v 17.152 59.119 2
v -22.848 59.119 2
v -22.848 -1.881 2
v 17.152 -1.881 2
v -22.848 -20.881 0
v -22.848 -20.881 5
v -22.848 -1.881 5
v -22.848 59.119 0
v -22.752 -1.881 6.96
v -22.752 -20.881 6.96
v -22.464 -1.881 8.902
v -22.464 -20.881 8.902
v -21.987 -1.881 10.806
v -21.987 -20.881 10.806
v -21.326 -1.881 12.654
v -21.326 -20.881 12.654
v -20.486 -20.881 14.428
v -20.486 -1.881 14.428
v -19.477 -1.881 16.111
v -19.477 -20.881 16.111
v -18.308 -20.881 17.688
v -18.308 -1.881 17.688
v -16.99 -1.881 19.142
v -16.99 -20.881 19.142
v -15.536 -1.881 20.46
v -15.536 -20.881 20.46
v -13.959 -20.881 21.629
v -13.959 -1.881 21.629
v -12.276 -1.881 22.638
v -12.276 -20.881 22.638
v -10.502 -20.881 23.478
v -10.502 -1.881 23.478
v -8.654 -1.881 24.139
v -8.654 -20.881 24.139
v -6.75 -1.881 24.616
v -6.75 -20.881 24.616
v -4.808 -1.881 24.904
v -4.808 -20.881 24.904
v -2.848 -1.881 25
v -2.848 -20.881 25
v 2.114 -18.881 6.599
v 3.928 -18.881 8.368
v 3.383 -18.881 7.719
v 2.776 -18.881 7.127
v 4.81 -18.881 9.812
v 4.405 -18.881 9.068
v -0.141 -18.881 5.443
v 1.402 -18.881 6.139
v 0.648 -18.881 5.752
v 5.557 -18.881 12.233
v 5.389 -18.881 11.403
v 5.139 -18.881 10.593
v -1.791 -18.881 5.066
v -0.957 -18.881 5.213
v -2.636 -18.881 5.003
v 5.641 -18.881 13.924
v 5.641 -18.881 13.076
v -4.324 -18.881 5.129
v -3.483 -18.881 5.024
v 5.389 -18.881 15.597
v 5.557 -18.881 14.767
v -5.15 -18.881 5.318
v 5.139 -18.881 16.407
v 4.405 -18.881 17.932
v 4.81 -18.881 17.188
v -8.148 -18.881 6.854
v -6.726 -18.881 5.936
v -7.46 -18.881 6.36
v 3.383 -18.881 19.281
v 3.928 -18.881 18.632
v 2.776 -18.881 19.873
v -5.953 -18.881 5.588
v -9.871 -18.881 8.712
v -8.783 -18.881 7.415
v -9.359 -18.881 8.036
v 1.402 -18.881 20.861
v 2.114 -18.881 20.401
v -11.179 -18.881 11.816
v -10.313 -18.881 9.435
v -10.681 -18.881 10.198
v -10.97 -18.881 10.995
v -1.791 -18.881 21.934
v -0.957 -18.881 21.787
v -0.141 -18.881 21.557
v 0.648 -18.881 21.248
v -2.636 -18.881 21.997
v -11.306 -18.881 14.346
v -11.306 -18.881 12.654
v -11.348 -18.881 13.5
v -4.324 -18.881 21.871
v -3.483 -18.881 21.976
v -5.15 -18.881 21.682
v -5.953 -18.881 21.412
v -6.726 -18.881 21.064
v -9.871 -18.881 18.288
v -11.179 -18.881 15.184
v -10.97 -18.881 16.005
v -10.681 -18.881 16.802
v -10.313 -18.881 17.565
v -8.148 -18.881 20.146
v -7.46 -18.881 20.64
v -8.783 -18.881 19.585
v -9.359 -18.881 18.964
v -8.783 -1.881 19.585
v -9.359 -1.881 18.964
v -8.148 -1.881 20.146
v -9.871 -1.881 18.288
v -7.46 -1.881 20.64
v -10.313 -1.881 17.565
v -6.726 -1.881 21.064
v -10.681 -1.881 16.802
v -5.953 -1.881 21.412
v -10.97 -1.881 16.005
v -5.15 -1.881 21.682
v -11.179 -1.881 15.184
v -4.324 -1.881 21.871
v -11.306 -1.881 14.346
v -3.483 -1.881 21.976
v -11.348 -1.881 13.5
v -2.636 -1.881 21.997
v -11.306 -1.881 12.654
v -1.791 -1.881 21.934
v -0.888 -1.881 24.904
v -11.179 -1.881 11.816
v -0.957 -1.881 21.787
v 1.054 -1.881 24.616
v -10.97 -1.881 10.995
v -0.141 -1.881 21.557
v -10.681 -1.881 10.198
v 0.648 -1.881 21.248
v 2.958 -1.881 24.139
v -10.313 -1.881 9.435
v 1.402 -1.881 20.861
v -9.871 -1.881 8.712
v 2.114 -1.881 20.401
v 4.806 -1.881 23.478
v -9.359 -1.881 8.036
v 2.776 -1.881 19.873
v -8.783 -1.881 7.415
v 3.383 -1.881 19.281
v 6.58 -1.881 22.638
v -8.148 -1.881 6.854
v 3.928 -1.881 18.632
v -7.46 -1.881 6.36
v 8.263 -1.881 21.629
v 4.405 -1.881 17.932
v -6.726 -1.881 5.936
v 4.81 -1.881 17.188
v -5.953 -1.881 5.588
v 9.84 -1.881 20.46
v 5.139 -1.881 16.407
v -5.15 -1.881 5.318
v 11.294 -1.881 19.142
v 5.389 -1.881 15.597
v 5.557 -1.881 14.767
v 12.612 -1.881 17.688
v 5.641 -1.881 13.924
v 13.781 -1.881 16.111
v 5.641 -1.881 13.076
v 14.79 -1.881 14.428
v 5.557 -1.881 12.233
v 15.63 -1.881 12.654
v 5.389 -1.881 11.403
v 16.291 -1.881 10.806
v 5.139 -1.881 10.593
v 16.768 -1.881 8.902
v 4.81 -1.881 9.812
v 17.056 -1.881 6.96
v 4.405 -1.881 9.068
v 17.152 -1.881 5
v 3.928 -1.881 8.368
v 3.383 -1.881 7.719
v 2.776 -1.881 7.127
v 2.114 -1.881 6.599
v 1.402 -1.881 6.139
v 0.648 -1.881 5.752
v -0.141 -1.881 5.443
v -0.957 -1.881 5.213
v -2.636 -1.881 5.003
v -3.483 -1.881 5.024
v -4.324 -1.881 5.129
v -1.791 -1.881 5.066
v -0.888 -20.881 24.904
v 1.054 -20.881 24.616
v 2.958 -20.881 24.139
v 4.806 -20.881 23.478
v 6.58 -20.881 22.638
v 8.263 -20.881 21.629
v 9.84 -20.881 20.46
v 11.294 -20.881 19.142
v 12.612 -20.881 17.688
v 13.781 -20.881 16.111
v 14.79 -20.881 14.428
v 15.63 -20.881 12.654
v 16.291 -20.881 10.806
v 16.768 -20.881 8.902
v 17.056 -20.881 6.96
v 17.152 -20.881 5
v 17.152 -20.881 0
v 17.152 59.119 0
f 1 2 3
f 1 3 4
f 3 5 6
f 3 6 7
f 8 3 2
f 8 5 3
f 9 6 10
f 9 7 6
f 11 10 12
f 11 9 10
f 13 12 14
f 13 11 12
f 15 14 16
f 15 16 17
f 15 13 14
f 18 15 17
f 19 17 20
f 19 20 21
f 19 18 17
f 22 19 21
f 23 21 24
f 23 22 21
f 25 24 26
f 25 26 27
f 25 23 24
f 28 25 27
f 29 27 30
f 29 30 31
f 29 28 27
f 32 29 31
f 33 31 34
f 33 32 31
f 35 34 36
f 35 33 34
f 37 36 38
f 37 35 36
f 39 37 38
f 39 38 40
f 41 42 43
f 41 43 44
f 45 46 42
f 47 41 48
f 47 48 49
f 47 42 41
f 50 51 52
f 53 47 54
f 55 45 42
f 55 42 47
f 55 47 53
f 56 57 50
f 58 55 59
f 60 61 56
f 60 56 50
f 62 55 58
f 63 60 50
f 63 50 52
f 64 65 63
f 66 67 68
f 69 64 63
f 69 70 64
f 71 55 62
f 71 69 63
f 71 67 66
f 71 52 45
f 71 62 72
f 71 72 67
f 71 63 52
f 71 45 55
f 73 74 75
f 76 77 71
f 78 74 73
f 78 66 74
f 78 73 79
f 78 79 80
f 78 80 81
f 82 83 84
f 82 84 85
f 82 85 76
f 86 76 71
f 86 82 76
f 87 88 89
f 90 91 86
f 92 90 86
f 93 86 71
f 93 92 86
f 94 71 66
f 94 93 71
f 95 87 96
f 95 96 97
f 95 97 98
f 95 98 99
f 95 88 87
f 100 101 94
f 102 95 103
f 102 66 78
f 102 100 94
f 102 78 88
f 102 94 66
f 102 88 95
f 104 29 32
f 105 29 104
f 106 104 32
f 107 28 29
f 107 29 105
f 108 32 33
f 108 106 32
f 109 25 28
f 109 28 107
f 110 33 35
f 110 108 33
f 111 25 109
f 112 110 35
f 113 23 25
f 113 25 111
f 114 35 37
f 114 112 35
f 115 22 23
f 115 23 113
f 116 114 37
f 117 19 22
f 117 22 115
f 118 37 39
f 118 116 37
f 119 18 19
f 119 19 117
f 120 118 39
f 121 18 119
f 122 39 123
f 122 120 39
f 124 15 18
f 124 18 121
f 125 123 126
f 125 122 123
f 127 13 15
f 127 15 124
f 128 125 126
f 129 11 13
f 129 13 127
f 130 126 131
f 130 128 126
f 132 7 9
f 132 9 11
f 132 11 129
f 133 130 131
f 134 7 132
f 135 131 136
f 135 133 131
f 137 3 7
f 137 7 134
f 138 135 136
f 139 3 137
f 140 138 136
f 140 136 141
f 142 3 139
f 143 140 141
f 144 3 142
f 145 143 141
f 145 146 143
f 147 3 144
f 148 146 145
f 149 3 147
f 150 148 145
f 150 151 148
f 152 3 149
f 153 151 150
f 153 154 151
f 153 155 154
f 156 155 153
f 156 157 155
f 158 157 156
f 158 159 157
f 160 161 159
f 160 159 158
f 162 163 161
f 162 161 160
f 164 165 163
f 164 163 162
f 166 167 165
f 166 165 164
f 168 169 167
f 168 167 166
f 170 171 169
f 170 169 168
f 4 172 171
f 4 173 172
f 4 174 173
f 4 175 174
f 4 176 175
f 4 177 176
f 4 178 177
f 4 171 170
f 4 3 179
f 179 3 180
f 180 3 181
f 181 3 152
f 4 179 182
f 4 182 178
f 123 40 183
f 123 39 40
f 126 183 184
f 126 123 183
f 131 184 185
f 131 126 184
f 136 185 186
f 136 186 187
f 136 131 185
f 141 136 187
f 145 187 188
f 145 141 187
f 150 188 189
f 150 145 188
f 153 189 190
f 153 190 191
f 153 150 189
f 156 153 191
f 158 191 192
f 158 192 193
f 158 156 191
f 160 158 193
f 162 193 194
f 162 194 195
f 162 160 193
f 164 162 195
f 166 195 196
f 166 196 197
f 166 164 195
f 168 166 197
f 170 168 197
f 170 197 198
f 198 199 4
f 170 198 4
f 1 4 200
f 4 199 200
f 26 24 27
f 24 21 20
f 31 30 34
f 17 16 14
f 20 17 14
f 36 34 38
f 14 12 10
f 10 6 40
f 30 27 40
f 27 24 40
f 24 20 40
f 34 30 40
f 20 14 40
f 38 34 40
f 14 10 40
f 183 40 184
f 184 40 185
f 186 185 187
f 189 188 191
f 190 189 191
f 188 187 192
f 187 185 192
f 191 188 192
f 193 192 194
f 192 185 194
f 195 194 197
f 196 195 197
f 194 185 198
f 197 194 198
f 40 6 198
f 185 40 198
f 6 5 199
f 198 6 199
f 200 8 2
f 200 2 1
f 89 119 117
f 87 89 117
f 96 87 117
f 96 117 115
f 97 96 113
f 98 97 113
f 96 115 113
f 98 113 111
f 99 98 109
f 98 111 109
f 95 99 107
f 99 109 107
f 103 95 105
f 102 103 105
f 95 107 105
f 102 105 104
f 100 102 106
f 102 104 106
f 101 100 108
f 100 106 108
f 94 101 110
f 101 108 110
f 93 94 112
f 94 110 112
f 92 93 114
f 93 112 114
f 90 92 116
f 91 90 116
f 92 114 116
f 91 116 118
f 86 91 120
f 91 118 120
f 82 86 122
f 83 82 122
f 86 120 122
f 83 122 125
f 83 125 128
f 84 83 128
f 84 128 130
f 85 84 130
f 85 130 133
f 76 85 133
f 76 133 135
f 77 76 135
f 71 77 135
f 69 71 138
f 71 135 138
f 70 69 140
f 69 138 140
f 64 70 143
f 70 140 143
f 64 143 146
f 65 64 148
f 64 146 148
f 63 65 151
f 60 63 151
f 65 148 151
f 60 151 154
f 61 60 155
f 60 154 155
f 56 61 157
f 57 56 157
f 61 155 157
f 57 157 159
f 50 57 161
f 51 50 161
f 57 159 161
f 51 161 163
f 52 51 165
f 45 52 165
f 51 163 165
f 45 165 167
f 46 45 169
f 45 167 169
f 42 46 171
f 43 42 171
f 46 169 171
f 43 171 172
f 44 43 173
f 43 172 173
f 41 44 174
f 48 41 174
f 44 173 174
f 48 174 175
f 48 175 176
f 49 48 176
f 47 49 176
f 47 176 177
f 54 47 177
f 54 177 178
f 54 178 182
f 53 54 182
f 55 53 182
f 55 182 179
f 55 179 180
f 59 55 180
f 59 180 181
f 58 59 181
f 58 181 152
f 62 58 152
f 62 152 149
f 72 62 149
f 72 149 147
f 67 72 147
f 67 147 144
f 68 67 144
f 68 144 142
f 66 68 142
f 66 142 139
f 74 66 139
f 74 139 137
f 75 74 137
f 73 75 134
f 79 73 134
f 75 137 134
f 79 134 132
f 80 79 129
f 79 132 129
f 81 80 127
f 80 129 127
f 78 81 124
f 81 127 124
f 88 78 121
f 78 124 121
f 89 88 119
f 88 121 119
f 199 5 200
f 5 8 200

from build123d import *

# Parameters (mm, degrees)
F0_W     = 40
F0_H     = 61
F1_DEPTH = 2
F0_H_2   = 19
F2_DEPTH = 25
F3_R     = 8.5
F4_DEPTH = 17
F5_R     = 19.99999


# Not quite as in the source:
# - a fillet or chamfer is up to 0.001 mm smaller than in the source, because OpenCascade refuses the exact size


with BuildPart() as f1:
    # F0 (on Top) → F1 (new body)
    with BuildSketch(Plane.XY):
        with Locations((-2.8480109572, 28.6193176061)):
            Rectangle(F0_W, F0_H)
    extrude(amount=F1_DEPTH)

    # F0 (on Top) → F2 (join)
    with BuildSketch(Plane.XY):
        with Locations((-2.8480109572, -11.3806823939)):
            Rectangle(F0_W, F0_H_2)
    extrude(amount=F2_DEPTH)

    # F3 (on face) → F4 (cut)
    with BuildSketch(Plane(origin=(0, -1.8806823939, 0), x_dir=(-1, 0, 0), z_dir=(0, 1, 0))):
        with Locations((2.8480109572, 13.5)):
            Circle(F3_R)
    extrude(amount=-F4_DEPTH, mode=Mode.SUBTRACT)

    # F5 (radius 20 in the source; OpenCascade refuses exactly that, so slightly less here)
    f5_edges = [f1.edges().sort_by_distance(p)[0] for p in [
        (17.151989, -11.380682, 25),
        (-22.848011, -11.380682, 25),
    ]]
    fillet(f5_edges, radius=F5_R)


solid = f1.part
